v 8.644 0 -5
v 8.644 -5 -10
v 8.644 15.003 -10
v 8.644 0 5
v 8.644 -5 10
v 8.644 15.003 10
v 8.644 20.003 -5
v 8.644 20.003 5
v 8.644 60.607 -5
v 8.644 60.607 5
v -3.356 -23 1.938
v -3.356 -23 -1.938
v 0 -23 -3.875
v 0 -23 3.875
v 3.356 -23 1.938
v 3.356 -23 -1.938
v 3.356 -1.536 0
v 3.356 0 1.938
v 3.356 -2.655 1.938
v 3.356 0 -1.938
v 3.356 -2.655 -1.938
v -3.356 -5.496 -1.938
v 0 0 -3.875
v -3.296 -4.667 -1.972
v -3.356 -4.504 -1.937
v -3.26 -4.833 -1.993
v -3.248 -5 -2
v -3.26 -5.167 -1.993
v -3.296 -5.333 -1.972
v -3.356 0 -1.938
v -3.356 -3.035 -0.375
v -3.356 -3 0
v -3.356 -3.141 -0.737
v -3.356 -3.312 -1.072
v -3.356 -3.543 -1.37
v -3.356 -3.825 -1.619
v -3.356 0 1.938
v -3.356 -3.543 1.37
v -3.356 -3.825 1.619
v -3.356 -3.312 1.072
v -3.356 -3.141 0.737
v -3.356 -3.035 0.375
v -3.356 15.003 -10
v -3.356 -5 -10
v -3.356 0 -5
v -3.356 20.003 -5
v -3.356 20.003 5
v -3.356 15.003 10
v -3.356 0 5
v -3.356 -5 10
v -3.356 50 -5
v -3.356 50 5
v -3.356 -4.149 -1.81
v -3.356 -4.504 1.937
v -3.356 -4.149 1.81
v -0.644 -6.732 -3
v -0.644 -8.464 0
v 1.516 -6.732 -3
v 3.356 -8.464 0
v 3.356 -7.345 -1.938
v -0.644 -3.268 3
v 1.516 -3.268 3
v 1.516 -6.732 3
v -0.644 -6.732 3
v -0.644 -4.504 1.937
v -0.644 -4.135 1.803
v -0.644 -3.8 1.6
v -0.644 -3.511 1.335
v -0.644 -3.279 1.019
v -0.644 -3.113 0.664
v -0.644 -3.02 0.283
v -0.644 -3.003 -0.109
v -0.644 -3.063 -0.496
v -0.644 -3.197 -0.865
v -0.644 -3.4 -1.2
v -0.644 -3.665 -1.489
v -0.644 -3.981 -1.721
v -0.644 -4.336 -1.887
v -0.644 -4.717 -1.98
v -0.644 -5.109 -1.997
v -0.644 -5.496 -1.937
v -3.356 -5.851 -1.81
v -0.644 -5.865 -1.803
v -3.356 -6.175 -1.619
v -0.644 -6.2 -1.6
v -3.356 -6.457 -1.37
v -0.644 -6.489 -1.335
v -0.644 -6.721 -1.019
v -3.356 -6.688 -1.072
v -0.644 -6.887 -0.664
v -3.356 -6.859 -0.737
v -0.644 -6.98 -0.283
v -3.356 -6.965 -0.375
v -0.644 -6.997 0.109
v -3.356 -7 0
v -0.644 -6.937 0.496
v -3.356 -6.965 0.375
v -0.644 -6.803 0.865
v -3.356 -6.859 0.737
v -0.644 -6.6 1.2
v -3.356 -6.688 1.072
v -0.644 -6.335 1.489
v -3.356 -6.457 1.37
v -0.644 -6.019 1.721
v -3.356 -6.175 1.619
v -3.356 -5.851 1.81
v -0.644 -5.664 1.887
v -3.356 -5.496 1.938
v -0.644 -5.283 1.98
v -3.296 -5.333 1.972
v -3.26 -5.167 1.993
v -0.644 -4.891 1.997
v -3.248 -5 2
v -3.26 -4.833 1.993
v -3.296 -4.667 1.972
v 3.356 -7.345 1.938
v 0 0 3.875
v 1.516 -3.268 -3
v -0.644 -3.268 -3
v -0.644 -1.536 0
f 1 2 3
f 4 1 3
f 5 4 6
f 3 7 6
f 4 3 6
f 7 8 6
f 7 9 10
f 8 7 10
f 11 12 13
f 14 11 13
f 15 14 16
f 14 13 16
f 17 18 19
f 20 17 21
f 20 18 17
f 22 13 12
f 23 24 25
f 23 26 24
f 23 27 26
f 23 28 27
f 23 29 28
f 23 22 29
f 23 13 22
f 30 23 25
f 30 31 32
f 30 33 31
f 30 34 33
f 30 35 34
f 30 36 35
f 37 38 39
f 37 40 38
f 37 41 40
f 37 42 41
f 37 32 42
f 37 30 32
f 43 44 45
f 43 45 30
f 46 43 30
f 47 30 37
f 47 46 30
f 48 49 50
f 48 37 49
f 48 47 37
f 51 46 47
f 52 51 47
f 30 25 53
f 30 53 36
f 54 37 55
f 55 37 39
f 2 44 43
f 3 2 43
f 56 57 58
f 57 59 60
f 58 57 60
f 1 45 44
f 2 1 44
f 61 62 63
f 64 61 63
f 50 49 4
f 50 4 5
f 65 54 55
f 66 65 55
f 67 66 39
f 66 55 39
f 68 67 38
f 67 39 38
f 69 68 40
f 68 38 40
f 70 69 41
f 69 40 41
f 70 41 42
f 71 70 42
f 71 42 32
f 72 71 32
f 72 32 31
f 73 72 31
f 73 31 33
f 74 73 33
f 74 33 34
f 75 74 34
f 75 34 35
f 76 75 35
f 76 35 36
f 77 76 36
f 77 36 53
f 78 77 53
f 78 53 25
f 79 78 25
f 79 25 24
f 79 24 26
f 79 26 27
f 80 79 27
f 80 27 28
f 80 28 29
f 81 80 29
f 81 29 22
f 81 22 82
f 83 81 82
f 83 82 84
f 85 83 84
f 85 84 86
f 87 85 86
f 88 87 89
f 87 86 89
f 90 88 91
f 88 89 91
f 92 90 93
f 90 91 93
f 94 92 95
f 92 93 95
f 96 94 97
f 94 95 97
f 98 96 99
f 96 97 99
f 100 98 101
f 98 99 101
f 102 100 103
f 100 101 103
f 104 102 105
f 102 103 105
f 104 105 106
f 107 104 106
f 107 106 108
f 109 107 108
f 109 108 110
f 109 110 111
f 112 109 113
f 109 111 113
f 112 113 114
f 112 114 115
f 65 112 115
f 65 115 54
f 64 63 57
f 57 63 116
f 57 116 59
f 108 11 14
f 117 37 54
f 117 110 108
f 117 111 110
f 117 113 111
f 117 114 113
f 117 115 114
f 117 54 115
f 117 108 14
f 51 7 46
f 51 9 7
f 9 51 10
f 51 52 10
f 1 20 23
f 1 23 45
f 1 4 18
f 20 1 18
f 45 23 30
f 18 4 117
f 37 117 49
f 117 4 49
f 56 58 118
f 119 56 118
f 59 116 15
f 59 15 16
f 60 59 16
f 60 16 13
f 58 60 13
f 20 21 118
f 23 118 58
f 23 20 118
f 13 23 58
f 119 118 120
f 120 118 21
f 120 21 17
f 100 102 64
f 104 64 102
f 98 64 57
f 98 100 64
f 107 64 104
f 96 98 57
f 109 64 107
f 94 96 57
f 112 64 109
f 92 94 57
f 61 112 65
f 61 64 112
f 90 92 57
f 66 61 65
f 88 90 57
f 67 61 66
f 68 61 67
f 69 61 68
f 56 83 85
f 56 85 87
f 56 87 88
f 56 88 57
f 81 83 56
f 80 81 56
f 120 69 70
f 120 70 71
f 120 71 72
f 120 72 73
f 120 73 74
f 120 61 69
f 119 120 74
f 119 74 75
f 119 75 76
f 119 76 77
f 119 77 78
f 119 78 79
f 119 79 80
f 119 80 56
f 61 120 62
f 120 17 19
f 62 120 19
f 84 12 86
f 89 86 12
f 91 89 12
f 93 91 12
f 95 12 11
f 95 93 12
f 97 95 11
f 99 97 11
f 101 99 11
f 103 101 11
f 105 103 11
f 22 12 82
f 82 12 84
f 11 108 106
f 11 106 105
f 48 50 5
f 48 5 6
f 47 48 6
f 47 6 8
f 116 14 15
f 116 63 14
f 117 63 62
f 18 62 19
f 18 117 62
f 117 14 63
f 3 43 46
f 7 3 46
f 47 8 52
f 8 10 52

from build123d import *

# Parameters (mm, degrees)
BOSS_EXTRUDE1_DEPTH = 23
SKETCH2_R           = 2
CUT_EXTRUDE1_DEPTH  = 10
CUT_EXTRUDE2_DEPTH  = 4
BOSS_EXTRUDE2_DEPTH = 5
BOSS_EXTRUDE3_DEPTH = 12


with BuildPart() as part:
    # Sketch1 → Boss-Extrude1 (new body)
    with BuildSketch(Plane(origin=(0, 0, 0), x_dir=(1, 0, 0), z_dir=(0, 1, 0))):
        Polygon((0, -3.875), (3.35584844, -1.9375), (3.35584844, 1.9375), (0, 3.875), (-3.35584844, 1.9375), (-3.35584844, -1.9375), align=None)
    extrude(amount=-BOSS_EXTRUDE1_DEPTH)

    # Sketch2 → Cut-Extrude1 (cut)
    with BuildSketch(Plane.ZY.offset(3.35584844)):
        with Locations(Location((0, -5, 0), (0, 0, 14.361511563))):
            Circle(SKETCH2_R)
    extrude(amount=-CUT_EXTRUDE1_DEPTH, mode=Mode.SUBTRACT)

    # Sketch3 → Cut-Extrude2 (cut)
    with BuildSketch(Plane(origin=(3.35584844, 0, 0), x_dir=(0, 0, -1), z_dir=(1, 0, 0))):
        Polygon((0, -8.464101615), (3, -6.732050808), (3, -3.267949192), (0, -1.535898385), (-3, -3.267949192), (-3, -6.732050808), align=None)
    extrude(amount=-CUT_EXTRUDE2_DEPTH, mode=Mode.SUBTRACT)

    # Sketch4 → Boss-Extrude2 (add, symmetric)
    with BuildSketch(Plane.XY):
        Polygon((-3.35584844, 0), (-3.35584844, 50), (8.64415156, 60.606601718), (8.64415156, 0), align=None)
    extrude(amount=BOSS_EXTRUDE2_DEPTH, both=True)

    # Sketch5 → Boss-Extrude3 (add)
    with BuildSketch(Plane.ZY.offset(3.35584844)):
        Polygon((5, 0), (10, -5), (10, 15.003286349), (5, 20.003286349), align=None)
        Polygon((-10, 15.003286349), (-5, 20.003286349), (-5, 0), (-10, -5), align=None)
    extrude(amount=-BOSS_EXTRUDE3_DEPTH)


solid = part.part
